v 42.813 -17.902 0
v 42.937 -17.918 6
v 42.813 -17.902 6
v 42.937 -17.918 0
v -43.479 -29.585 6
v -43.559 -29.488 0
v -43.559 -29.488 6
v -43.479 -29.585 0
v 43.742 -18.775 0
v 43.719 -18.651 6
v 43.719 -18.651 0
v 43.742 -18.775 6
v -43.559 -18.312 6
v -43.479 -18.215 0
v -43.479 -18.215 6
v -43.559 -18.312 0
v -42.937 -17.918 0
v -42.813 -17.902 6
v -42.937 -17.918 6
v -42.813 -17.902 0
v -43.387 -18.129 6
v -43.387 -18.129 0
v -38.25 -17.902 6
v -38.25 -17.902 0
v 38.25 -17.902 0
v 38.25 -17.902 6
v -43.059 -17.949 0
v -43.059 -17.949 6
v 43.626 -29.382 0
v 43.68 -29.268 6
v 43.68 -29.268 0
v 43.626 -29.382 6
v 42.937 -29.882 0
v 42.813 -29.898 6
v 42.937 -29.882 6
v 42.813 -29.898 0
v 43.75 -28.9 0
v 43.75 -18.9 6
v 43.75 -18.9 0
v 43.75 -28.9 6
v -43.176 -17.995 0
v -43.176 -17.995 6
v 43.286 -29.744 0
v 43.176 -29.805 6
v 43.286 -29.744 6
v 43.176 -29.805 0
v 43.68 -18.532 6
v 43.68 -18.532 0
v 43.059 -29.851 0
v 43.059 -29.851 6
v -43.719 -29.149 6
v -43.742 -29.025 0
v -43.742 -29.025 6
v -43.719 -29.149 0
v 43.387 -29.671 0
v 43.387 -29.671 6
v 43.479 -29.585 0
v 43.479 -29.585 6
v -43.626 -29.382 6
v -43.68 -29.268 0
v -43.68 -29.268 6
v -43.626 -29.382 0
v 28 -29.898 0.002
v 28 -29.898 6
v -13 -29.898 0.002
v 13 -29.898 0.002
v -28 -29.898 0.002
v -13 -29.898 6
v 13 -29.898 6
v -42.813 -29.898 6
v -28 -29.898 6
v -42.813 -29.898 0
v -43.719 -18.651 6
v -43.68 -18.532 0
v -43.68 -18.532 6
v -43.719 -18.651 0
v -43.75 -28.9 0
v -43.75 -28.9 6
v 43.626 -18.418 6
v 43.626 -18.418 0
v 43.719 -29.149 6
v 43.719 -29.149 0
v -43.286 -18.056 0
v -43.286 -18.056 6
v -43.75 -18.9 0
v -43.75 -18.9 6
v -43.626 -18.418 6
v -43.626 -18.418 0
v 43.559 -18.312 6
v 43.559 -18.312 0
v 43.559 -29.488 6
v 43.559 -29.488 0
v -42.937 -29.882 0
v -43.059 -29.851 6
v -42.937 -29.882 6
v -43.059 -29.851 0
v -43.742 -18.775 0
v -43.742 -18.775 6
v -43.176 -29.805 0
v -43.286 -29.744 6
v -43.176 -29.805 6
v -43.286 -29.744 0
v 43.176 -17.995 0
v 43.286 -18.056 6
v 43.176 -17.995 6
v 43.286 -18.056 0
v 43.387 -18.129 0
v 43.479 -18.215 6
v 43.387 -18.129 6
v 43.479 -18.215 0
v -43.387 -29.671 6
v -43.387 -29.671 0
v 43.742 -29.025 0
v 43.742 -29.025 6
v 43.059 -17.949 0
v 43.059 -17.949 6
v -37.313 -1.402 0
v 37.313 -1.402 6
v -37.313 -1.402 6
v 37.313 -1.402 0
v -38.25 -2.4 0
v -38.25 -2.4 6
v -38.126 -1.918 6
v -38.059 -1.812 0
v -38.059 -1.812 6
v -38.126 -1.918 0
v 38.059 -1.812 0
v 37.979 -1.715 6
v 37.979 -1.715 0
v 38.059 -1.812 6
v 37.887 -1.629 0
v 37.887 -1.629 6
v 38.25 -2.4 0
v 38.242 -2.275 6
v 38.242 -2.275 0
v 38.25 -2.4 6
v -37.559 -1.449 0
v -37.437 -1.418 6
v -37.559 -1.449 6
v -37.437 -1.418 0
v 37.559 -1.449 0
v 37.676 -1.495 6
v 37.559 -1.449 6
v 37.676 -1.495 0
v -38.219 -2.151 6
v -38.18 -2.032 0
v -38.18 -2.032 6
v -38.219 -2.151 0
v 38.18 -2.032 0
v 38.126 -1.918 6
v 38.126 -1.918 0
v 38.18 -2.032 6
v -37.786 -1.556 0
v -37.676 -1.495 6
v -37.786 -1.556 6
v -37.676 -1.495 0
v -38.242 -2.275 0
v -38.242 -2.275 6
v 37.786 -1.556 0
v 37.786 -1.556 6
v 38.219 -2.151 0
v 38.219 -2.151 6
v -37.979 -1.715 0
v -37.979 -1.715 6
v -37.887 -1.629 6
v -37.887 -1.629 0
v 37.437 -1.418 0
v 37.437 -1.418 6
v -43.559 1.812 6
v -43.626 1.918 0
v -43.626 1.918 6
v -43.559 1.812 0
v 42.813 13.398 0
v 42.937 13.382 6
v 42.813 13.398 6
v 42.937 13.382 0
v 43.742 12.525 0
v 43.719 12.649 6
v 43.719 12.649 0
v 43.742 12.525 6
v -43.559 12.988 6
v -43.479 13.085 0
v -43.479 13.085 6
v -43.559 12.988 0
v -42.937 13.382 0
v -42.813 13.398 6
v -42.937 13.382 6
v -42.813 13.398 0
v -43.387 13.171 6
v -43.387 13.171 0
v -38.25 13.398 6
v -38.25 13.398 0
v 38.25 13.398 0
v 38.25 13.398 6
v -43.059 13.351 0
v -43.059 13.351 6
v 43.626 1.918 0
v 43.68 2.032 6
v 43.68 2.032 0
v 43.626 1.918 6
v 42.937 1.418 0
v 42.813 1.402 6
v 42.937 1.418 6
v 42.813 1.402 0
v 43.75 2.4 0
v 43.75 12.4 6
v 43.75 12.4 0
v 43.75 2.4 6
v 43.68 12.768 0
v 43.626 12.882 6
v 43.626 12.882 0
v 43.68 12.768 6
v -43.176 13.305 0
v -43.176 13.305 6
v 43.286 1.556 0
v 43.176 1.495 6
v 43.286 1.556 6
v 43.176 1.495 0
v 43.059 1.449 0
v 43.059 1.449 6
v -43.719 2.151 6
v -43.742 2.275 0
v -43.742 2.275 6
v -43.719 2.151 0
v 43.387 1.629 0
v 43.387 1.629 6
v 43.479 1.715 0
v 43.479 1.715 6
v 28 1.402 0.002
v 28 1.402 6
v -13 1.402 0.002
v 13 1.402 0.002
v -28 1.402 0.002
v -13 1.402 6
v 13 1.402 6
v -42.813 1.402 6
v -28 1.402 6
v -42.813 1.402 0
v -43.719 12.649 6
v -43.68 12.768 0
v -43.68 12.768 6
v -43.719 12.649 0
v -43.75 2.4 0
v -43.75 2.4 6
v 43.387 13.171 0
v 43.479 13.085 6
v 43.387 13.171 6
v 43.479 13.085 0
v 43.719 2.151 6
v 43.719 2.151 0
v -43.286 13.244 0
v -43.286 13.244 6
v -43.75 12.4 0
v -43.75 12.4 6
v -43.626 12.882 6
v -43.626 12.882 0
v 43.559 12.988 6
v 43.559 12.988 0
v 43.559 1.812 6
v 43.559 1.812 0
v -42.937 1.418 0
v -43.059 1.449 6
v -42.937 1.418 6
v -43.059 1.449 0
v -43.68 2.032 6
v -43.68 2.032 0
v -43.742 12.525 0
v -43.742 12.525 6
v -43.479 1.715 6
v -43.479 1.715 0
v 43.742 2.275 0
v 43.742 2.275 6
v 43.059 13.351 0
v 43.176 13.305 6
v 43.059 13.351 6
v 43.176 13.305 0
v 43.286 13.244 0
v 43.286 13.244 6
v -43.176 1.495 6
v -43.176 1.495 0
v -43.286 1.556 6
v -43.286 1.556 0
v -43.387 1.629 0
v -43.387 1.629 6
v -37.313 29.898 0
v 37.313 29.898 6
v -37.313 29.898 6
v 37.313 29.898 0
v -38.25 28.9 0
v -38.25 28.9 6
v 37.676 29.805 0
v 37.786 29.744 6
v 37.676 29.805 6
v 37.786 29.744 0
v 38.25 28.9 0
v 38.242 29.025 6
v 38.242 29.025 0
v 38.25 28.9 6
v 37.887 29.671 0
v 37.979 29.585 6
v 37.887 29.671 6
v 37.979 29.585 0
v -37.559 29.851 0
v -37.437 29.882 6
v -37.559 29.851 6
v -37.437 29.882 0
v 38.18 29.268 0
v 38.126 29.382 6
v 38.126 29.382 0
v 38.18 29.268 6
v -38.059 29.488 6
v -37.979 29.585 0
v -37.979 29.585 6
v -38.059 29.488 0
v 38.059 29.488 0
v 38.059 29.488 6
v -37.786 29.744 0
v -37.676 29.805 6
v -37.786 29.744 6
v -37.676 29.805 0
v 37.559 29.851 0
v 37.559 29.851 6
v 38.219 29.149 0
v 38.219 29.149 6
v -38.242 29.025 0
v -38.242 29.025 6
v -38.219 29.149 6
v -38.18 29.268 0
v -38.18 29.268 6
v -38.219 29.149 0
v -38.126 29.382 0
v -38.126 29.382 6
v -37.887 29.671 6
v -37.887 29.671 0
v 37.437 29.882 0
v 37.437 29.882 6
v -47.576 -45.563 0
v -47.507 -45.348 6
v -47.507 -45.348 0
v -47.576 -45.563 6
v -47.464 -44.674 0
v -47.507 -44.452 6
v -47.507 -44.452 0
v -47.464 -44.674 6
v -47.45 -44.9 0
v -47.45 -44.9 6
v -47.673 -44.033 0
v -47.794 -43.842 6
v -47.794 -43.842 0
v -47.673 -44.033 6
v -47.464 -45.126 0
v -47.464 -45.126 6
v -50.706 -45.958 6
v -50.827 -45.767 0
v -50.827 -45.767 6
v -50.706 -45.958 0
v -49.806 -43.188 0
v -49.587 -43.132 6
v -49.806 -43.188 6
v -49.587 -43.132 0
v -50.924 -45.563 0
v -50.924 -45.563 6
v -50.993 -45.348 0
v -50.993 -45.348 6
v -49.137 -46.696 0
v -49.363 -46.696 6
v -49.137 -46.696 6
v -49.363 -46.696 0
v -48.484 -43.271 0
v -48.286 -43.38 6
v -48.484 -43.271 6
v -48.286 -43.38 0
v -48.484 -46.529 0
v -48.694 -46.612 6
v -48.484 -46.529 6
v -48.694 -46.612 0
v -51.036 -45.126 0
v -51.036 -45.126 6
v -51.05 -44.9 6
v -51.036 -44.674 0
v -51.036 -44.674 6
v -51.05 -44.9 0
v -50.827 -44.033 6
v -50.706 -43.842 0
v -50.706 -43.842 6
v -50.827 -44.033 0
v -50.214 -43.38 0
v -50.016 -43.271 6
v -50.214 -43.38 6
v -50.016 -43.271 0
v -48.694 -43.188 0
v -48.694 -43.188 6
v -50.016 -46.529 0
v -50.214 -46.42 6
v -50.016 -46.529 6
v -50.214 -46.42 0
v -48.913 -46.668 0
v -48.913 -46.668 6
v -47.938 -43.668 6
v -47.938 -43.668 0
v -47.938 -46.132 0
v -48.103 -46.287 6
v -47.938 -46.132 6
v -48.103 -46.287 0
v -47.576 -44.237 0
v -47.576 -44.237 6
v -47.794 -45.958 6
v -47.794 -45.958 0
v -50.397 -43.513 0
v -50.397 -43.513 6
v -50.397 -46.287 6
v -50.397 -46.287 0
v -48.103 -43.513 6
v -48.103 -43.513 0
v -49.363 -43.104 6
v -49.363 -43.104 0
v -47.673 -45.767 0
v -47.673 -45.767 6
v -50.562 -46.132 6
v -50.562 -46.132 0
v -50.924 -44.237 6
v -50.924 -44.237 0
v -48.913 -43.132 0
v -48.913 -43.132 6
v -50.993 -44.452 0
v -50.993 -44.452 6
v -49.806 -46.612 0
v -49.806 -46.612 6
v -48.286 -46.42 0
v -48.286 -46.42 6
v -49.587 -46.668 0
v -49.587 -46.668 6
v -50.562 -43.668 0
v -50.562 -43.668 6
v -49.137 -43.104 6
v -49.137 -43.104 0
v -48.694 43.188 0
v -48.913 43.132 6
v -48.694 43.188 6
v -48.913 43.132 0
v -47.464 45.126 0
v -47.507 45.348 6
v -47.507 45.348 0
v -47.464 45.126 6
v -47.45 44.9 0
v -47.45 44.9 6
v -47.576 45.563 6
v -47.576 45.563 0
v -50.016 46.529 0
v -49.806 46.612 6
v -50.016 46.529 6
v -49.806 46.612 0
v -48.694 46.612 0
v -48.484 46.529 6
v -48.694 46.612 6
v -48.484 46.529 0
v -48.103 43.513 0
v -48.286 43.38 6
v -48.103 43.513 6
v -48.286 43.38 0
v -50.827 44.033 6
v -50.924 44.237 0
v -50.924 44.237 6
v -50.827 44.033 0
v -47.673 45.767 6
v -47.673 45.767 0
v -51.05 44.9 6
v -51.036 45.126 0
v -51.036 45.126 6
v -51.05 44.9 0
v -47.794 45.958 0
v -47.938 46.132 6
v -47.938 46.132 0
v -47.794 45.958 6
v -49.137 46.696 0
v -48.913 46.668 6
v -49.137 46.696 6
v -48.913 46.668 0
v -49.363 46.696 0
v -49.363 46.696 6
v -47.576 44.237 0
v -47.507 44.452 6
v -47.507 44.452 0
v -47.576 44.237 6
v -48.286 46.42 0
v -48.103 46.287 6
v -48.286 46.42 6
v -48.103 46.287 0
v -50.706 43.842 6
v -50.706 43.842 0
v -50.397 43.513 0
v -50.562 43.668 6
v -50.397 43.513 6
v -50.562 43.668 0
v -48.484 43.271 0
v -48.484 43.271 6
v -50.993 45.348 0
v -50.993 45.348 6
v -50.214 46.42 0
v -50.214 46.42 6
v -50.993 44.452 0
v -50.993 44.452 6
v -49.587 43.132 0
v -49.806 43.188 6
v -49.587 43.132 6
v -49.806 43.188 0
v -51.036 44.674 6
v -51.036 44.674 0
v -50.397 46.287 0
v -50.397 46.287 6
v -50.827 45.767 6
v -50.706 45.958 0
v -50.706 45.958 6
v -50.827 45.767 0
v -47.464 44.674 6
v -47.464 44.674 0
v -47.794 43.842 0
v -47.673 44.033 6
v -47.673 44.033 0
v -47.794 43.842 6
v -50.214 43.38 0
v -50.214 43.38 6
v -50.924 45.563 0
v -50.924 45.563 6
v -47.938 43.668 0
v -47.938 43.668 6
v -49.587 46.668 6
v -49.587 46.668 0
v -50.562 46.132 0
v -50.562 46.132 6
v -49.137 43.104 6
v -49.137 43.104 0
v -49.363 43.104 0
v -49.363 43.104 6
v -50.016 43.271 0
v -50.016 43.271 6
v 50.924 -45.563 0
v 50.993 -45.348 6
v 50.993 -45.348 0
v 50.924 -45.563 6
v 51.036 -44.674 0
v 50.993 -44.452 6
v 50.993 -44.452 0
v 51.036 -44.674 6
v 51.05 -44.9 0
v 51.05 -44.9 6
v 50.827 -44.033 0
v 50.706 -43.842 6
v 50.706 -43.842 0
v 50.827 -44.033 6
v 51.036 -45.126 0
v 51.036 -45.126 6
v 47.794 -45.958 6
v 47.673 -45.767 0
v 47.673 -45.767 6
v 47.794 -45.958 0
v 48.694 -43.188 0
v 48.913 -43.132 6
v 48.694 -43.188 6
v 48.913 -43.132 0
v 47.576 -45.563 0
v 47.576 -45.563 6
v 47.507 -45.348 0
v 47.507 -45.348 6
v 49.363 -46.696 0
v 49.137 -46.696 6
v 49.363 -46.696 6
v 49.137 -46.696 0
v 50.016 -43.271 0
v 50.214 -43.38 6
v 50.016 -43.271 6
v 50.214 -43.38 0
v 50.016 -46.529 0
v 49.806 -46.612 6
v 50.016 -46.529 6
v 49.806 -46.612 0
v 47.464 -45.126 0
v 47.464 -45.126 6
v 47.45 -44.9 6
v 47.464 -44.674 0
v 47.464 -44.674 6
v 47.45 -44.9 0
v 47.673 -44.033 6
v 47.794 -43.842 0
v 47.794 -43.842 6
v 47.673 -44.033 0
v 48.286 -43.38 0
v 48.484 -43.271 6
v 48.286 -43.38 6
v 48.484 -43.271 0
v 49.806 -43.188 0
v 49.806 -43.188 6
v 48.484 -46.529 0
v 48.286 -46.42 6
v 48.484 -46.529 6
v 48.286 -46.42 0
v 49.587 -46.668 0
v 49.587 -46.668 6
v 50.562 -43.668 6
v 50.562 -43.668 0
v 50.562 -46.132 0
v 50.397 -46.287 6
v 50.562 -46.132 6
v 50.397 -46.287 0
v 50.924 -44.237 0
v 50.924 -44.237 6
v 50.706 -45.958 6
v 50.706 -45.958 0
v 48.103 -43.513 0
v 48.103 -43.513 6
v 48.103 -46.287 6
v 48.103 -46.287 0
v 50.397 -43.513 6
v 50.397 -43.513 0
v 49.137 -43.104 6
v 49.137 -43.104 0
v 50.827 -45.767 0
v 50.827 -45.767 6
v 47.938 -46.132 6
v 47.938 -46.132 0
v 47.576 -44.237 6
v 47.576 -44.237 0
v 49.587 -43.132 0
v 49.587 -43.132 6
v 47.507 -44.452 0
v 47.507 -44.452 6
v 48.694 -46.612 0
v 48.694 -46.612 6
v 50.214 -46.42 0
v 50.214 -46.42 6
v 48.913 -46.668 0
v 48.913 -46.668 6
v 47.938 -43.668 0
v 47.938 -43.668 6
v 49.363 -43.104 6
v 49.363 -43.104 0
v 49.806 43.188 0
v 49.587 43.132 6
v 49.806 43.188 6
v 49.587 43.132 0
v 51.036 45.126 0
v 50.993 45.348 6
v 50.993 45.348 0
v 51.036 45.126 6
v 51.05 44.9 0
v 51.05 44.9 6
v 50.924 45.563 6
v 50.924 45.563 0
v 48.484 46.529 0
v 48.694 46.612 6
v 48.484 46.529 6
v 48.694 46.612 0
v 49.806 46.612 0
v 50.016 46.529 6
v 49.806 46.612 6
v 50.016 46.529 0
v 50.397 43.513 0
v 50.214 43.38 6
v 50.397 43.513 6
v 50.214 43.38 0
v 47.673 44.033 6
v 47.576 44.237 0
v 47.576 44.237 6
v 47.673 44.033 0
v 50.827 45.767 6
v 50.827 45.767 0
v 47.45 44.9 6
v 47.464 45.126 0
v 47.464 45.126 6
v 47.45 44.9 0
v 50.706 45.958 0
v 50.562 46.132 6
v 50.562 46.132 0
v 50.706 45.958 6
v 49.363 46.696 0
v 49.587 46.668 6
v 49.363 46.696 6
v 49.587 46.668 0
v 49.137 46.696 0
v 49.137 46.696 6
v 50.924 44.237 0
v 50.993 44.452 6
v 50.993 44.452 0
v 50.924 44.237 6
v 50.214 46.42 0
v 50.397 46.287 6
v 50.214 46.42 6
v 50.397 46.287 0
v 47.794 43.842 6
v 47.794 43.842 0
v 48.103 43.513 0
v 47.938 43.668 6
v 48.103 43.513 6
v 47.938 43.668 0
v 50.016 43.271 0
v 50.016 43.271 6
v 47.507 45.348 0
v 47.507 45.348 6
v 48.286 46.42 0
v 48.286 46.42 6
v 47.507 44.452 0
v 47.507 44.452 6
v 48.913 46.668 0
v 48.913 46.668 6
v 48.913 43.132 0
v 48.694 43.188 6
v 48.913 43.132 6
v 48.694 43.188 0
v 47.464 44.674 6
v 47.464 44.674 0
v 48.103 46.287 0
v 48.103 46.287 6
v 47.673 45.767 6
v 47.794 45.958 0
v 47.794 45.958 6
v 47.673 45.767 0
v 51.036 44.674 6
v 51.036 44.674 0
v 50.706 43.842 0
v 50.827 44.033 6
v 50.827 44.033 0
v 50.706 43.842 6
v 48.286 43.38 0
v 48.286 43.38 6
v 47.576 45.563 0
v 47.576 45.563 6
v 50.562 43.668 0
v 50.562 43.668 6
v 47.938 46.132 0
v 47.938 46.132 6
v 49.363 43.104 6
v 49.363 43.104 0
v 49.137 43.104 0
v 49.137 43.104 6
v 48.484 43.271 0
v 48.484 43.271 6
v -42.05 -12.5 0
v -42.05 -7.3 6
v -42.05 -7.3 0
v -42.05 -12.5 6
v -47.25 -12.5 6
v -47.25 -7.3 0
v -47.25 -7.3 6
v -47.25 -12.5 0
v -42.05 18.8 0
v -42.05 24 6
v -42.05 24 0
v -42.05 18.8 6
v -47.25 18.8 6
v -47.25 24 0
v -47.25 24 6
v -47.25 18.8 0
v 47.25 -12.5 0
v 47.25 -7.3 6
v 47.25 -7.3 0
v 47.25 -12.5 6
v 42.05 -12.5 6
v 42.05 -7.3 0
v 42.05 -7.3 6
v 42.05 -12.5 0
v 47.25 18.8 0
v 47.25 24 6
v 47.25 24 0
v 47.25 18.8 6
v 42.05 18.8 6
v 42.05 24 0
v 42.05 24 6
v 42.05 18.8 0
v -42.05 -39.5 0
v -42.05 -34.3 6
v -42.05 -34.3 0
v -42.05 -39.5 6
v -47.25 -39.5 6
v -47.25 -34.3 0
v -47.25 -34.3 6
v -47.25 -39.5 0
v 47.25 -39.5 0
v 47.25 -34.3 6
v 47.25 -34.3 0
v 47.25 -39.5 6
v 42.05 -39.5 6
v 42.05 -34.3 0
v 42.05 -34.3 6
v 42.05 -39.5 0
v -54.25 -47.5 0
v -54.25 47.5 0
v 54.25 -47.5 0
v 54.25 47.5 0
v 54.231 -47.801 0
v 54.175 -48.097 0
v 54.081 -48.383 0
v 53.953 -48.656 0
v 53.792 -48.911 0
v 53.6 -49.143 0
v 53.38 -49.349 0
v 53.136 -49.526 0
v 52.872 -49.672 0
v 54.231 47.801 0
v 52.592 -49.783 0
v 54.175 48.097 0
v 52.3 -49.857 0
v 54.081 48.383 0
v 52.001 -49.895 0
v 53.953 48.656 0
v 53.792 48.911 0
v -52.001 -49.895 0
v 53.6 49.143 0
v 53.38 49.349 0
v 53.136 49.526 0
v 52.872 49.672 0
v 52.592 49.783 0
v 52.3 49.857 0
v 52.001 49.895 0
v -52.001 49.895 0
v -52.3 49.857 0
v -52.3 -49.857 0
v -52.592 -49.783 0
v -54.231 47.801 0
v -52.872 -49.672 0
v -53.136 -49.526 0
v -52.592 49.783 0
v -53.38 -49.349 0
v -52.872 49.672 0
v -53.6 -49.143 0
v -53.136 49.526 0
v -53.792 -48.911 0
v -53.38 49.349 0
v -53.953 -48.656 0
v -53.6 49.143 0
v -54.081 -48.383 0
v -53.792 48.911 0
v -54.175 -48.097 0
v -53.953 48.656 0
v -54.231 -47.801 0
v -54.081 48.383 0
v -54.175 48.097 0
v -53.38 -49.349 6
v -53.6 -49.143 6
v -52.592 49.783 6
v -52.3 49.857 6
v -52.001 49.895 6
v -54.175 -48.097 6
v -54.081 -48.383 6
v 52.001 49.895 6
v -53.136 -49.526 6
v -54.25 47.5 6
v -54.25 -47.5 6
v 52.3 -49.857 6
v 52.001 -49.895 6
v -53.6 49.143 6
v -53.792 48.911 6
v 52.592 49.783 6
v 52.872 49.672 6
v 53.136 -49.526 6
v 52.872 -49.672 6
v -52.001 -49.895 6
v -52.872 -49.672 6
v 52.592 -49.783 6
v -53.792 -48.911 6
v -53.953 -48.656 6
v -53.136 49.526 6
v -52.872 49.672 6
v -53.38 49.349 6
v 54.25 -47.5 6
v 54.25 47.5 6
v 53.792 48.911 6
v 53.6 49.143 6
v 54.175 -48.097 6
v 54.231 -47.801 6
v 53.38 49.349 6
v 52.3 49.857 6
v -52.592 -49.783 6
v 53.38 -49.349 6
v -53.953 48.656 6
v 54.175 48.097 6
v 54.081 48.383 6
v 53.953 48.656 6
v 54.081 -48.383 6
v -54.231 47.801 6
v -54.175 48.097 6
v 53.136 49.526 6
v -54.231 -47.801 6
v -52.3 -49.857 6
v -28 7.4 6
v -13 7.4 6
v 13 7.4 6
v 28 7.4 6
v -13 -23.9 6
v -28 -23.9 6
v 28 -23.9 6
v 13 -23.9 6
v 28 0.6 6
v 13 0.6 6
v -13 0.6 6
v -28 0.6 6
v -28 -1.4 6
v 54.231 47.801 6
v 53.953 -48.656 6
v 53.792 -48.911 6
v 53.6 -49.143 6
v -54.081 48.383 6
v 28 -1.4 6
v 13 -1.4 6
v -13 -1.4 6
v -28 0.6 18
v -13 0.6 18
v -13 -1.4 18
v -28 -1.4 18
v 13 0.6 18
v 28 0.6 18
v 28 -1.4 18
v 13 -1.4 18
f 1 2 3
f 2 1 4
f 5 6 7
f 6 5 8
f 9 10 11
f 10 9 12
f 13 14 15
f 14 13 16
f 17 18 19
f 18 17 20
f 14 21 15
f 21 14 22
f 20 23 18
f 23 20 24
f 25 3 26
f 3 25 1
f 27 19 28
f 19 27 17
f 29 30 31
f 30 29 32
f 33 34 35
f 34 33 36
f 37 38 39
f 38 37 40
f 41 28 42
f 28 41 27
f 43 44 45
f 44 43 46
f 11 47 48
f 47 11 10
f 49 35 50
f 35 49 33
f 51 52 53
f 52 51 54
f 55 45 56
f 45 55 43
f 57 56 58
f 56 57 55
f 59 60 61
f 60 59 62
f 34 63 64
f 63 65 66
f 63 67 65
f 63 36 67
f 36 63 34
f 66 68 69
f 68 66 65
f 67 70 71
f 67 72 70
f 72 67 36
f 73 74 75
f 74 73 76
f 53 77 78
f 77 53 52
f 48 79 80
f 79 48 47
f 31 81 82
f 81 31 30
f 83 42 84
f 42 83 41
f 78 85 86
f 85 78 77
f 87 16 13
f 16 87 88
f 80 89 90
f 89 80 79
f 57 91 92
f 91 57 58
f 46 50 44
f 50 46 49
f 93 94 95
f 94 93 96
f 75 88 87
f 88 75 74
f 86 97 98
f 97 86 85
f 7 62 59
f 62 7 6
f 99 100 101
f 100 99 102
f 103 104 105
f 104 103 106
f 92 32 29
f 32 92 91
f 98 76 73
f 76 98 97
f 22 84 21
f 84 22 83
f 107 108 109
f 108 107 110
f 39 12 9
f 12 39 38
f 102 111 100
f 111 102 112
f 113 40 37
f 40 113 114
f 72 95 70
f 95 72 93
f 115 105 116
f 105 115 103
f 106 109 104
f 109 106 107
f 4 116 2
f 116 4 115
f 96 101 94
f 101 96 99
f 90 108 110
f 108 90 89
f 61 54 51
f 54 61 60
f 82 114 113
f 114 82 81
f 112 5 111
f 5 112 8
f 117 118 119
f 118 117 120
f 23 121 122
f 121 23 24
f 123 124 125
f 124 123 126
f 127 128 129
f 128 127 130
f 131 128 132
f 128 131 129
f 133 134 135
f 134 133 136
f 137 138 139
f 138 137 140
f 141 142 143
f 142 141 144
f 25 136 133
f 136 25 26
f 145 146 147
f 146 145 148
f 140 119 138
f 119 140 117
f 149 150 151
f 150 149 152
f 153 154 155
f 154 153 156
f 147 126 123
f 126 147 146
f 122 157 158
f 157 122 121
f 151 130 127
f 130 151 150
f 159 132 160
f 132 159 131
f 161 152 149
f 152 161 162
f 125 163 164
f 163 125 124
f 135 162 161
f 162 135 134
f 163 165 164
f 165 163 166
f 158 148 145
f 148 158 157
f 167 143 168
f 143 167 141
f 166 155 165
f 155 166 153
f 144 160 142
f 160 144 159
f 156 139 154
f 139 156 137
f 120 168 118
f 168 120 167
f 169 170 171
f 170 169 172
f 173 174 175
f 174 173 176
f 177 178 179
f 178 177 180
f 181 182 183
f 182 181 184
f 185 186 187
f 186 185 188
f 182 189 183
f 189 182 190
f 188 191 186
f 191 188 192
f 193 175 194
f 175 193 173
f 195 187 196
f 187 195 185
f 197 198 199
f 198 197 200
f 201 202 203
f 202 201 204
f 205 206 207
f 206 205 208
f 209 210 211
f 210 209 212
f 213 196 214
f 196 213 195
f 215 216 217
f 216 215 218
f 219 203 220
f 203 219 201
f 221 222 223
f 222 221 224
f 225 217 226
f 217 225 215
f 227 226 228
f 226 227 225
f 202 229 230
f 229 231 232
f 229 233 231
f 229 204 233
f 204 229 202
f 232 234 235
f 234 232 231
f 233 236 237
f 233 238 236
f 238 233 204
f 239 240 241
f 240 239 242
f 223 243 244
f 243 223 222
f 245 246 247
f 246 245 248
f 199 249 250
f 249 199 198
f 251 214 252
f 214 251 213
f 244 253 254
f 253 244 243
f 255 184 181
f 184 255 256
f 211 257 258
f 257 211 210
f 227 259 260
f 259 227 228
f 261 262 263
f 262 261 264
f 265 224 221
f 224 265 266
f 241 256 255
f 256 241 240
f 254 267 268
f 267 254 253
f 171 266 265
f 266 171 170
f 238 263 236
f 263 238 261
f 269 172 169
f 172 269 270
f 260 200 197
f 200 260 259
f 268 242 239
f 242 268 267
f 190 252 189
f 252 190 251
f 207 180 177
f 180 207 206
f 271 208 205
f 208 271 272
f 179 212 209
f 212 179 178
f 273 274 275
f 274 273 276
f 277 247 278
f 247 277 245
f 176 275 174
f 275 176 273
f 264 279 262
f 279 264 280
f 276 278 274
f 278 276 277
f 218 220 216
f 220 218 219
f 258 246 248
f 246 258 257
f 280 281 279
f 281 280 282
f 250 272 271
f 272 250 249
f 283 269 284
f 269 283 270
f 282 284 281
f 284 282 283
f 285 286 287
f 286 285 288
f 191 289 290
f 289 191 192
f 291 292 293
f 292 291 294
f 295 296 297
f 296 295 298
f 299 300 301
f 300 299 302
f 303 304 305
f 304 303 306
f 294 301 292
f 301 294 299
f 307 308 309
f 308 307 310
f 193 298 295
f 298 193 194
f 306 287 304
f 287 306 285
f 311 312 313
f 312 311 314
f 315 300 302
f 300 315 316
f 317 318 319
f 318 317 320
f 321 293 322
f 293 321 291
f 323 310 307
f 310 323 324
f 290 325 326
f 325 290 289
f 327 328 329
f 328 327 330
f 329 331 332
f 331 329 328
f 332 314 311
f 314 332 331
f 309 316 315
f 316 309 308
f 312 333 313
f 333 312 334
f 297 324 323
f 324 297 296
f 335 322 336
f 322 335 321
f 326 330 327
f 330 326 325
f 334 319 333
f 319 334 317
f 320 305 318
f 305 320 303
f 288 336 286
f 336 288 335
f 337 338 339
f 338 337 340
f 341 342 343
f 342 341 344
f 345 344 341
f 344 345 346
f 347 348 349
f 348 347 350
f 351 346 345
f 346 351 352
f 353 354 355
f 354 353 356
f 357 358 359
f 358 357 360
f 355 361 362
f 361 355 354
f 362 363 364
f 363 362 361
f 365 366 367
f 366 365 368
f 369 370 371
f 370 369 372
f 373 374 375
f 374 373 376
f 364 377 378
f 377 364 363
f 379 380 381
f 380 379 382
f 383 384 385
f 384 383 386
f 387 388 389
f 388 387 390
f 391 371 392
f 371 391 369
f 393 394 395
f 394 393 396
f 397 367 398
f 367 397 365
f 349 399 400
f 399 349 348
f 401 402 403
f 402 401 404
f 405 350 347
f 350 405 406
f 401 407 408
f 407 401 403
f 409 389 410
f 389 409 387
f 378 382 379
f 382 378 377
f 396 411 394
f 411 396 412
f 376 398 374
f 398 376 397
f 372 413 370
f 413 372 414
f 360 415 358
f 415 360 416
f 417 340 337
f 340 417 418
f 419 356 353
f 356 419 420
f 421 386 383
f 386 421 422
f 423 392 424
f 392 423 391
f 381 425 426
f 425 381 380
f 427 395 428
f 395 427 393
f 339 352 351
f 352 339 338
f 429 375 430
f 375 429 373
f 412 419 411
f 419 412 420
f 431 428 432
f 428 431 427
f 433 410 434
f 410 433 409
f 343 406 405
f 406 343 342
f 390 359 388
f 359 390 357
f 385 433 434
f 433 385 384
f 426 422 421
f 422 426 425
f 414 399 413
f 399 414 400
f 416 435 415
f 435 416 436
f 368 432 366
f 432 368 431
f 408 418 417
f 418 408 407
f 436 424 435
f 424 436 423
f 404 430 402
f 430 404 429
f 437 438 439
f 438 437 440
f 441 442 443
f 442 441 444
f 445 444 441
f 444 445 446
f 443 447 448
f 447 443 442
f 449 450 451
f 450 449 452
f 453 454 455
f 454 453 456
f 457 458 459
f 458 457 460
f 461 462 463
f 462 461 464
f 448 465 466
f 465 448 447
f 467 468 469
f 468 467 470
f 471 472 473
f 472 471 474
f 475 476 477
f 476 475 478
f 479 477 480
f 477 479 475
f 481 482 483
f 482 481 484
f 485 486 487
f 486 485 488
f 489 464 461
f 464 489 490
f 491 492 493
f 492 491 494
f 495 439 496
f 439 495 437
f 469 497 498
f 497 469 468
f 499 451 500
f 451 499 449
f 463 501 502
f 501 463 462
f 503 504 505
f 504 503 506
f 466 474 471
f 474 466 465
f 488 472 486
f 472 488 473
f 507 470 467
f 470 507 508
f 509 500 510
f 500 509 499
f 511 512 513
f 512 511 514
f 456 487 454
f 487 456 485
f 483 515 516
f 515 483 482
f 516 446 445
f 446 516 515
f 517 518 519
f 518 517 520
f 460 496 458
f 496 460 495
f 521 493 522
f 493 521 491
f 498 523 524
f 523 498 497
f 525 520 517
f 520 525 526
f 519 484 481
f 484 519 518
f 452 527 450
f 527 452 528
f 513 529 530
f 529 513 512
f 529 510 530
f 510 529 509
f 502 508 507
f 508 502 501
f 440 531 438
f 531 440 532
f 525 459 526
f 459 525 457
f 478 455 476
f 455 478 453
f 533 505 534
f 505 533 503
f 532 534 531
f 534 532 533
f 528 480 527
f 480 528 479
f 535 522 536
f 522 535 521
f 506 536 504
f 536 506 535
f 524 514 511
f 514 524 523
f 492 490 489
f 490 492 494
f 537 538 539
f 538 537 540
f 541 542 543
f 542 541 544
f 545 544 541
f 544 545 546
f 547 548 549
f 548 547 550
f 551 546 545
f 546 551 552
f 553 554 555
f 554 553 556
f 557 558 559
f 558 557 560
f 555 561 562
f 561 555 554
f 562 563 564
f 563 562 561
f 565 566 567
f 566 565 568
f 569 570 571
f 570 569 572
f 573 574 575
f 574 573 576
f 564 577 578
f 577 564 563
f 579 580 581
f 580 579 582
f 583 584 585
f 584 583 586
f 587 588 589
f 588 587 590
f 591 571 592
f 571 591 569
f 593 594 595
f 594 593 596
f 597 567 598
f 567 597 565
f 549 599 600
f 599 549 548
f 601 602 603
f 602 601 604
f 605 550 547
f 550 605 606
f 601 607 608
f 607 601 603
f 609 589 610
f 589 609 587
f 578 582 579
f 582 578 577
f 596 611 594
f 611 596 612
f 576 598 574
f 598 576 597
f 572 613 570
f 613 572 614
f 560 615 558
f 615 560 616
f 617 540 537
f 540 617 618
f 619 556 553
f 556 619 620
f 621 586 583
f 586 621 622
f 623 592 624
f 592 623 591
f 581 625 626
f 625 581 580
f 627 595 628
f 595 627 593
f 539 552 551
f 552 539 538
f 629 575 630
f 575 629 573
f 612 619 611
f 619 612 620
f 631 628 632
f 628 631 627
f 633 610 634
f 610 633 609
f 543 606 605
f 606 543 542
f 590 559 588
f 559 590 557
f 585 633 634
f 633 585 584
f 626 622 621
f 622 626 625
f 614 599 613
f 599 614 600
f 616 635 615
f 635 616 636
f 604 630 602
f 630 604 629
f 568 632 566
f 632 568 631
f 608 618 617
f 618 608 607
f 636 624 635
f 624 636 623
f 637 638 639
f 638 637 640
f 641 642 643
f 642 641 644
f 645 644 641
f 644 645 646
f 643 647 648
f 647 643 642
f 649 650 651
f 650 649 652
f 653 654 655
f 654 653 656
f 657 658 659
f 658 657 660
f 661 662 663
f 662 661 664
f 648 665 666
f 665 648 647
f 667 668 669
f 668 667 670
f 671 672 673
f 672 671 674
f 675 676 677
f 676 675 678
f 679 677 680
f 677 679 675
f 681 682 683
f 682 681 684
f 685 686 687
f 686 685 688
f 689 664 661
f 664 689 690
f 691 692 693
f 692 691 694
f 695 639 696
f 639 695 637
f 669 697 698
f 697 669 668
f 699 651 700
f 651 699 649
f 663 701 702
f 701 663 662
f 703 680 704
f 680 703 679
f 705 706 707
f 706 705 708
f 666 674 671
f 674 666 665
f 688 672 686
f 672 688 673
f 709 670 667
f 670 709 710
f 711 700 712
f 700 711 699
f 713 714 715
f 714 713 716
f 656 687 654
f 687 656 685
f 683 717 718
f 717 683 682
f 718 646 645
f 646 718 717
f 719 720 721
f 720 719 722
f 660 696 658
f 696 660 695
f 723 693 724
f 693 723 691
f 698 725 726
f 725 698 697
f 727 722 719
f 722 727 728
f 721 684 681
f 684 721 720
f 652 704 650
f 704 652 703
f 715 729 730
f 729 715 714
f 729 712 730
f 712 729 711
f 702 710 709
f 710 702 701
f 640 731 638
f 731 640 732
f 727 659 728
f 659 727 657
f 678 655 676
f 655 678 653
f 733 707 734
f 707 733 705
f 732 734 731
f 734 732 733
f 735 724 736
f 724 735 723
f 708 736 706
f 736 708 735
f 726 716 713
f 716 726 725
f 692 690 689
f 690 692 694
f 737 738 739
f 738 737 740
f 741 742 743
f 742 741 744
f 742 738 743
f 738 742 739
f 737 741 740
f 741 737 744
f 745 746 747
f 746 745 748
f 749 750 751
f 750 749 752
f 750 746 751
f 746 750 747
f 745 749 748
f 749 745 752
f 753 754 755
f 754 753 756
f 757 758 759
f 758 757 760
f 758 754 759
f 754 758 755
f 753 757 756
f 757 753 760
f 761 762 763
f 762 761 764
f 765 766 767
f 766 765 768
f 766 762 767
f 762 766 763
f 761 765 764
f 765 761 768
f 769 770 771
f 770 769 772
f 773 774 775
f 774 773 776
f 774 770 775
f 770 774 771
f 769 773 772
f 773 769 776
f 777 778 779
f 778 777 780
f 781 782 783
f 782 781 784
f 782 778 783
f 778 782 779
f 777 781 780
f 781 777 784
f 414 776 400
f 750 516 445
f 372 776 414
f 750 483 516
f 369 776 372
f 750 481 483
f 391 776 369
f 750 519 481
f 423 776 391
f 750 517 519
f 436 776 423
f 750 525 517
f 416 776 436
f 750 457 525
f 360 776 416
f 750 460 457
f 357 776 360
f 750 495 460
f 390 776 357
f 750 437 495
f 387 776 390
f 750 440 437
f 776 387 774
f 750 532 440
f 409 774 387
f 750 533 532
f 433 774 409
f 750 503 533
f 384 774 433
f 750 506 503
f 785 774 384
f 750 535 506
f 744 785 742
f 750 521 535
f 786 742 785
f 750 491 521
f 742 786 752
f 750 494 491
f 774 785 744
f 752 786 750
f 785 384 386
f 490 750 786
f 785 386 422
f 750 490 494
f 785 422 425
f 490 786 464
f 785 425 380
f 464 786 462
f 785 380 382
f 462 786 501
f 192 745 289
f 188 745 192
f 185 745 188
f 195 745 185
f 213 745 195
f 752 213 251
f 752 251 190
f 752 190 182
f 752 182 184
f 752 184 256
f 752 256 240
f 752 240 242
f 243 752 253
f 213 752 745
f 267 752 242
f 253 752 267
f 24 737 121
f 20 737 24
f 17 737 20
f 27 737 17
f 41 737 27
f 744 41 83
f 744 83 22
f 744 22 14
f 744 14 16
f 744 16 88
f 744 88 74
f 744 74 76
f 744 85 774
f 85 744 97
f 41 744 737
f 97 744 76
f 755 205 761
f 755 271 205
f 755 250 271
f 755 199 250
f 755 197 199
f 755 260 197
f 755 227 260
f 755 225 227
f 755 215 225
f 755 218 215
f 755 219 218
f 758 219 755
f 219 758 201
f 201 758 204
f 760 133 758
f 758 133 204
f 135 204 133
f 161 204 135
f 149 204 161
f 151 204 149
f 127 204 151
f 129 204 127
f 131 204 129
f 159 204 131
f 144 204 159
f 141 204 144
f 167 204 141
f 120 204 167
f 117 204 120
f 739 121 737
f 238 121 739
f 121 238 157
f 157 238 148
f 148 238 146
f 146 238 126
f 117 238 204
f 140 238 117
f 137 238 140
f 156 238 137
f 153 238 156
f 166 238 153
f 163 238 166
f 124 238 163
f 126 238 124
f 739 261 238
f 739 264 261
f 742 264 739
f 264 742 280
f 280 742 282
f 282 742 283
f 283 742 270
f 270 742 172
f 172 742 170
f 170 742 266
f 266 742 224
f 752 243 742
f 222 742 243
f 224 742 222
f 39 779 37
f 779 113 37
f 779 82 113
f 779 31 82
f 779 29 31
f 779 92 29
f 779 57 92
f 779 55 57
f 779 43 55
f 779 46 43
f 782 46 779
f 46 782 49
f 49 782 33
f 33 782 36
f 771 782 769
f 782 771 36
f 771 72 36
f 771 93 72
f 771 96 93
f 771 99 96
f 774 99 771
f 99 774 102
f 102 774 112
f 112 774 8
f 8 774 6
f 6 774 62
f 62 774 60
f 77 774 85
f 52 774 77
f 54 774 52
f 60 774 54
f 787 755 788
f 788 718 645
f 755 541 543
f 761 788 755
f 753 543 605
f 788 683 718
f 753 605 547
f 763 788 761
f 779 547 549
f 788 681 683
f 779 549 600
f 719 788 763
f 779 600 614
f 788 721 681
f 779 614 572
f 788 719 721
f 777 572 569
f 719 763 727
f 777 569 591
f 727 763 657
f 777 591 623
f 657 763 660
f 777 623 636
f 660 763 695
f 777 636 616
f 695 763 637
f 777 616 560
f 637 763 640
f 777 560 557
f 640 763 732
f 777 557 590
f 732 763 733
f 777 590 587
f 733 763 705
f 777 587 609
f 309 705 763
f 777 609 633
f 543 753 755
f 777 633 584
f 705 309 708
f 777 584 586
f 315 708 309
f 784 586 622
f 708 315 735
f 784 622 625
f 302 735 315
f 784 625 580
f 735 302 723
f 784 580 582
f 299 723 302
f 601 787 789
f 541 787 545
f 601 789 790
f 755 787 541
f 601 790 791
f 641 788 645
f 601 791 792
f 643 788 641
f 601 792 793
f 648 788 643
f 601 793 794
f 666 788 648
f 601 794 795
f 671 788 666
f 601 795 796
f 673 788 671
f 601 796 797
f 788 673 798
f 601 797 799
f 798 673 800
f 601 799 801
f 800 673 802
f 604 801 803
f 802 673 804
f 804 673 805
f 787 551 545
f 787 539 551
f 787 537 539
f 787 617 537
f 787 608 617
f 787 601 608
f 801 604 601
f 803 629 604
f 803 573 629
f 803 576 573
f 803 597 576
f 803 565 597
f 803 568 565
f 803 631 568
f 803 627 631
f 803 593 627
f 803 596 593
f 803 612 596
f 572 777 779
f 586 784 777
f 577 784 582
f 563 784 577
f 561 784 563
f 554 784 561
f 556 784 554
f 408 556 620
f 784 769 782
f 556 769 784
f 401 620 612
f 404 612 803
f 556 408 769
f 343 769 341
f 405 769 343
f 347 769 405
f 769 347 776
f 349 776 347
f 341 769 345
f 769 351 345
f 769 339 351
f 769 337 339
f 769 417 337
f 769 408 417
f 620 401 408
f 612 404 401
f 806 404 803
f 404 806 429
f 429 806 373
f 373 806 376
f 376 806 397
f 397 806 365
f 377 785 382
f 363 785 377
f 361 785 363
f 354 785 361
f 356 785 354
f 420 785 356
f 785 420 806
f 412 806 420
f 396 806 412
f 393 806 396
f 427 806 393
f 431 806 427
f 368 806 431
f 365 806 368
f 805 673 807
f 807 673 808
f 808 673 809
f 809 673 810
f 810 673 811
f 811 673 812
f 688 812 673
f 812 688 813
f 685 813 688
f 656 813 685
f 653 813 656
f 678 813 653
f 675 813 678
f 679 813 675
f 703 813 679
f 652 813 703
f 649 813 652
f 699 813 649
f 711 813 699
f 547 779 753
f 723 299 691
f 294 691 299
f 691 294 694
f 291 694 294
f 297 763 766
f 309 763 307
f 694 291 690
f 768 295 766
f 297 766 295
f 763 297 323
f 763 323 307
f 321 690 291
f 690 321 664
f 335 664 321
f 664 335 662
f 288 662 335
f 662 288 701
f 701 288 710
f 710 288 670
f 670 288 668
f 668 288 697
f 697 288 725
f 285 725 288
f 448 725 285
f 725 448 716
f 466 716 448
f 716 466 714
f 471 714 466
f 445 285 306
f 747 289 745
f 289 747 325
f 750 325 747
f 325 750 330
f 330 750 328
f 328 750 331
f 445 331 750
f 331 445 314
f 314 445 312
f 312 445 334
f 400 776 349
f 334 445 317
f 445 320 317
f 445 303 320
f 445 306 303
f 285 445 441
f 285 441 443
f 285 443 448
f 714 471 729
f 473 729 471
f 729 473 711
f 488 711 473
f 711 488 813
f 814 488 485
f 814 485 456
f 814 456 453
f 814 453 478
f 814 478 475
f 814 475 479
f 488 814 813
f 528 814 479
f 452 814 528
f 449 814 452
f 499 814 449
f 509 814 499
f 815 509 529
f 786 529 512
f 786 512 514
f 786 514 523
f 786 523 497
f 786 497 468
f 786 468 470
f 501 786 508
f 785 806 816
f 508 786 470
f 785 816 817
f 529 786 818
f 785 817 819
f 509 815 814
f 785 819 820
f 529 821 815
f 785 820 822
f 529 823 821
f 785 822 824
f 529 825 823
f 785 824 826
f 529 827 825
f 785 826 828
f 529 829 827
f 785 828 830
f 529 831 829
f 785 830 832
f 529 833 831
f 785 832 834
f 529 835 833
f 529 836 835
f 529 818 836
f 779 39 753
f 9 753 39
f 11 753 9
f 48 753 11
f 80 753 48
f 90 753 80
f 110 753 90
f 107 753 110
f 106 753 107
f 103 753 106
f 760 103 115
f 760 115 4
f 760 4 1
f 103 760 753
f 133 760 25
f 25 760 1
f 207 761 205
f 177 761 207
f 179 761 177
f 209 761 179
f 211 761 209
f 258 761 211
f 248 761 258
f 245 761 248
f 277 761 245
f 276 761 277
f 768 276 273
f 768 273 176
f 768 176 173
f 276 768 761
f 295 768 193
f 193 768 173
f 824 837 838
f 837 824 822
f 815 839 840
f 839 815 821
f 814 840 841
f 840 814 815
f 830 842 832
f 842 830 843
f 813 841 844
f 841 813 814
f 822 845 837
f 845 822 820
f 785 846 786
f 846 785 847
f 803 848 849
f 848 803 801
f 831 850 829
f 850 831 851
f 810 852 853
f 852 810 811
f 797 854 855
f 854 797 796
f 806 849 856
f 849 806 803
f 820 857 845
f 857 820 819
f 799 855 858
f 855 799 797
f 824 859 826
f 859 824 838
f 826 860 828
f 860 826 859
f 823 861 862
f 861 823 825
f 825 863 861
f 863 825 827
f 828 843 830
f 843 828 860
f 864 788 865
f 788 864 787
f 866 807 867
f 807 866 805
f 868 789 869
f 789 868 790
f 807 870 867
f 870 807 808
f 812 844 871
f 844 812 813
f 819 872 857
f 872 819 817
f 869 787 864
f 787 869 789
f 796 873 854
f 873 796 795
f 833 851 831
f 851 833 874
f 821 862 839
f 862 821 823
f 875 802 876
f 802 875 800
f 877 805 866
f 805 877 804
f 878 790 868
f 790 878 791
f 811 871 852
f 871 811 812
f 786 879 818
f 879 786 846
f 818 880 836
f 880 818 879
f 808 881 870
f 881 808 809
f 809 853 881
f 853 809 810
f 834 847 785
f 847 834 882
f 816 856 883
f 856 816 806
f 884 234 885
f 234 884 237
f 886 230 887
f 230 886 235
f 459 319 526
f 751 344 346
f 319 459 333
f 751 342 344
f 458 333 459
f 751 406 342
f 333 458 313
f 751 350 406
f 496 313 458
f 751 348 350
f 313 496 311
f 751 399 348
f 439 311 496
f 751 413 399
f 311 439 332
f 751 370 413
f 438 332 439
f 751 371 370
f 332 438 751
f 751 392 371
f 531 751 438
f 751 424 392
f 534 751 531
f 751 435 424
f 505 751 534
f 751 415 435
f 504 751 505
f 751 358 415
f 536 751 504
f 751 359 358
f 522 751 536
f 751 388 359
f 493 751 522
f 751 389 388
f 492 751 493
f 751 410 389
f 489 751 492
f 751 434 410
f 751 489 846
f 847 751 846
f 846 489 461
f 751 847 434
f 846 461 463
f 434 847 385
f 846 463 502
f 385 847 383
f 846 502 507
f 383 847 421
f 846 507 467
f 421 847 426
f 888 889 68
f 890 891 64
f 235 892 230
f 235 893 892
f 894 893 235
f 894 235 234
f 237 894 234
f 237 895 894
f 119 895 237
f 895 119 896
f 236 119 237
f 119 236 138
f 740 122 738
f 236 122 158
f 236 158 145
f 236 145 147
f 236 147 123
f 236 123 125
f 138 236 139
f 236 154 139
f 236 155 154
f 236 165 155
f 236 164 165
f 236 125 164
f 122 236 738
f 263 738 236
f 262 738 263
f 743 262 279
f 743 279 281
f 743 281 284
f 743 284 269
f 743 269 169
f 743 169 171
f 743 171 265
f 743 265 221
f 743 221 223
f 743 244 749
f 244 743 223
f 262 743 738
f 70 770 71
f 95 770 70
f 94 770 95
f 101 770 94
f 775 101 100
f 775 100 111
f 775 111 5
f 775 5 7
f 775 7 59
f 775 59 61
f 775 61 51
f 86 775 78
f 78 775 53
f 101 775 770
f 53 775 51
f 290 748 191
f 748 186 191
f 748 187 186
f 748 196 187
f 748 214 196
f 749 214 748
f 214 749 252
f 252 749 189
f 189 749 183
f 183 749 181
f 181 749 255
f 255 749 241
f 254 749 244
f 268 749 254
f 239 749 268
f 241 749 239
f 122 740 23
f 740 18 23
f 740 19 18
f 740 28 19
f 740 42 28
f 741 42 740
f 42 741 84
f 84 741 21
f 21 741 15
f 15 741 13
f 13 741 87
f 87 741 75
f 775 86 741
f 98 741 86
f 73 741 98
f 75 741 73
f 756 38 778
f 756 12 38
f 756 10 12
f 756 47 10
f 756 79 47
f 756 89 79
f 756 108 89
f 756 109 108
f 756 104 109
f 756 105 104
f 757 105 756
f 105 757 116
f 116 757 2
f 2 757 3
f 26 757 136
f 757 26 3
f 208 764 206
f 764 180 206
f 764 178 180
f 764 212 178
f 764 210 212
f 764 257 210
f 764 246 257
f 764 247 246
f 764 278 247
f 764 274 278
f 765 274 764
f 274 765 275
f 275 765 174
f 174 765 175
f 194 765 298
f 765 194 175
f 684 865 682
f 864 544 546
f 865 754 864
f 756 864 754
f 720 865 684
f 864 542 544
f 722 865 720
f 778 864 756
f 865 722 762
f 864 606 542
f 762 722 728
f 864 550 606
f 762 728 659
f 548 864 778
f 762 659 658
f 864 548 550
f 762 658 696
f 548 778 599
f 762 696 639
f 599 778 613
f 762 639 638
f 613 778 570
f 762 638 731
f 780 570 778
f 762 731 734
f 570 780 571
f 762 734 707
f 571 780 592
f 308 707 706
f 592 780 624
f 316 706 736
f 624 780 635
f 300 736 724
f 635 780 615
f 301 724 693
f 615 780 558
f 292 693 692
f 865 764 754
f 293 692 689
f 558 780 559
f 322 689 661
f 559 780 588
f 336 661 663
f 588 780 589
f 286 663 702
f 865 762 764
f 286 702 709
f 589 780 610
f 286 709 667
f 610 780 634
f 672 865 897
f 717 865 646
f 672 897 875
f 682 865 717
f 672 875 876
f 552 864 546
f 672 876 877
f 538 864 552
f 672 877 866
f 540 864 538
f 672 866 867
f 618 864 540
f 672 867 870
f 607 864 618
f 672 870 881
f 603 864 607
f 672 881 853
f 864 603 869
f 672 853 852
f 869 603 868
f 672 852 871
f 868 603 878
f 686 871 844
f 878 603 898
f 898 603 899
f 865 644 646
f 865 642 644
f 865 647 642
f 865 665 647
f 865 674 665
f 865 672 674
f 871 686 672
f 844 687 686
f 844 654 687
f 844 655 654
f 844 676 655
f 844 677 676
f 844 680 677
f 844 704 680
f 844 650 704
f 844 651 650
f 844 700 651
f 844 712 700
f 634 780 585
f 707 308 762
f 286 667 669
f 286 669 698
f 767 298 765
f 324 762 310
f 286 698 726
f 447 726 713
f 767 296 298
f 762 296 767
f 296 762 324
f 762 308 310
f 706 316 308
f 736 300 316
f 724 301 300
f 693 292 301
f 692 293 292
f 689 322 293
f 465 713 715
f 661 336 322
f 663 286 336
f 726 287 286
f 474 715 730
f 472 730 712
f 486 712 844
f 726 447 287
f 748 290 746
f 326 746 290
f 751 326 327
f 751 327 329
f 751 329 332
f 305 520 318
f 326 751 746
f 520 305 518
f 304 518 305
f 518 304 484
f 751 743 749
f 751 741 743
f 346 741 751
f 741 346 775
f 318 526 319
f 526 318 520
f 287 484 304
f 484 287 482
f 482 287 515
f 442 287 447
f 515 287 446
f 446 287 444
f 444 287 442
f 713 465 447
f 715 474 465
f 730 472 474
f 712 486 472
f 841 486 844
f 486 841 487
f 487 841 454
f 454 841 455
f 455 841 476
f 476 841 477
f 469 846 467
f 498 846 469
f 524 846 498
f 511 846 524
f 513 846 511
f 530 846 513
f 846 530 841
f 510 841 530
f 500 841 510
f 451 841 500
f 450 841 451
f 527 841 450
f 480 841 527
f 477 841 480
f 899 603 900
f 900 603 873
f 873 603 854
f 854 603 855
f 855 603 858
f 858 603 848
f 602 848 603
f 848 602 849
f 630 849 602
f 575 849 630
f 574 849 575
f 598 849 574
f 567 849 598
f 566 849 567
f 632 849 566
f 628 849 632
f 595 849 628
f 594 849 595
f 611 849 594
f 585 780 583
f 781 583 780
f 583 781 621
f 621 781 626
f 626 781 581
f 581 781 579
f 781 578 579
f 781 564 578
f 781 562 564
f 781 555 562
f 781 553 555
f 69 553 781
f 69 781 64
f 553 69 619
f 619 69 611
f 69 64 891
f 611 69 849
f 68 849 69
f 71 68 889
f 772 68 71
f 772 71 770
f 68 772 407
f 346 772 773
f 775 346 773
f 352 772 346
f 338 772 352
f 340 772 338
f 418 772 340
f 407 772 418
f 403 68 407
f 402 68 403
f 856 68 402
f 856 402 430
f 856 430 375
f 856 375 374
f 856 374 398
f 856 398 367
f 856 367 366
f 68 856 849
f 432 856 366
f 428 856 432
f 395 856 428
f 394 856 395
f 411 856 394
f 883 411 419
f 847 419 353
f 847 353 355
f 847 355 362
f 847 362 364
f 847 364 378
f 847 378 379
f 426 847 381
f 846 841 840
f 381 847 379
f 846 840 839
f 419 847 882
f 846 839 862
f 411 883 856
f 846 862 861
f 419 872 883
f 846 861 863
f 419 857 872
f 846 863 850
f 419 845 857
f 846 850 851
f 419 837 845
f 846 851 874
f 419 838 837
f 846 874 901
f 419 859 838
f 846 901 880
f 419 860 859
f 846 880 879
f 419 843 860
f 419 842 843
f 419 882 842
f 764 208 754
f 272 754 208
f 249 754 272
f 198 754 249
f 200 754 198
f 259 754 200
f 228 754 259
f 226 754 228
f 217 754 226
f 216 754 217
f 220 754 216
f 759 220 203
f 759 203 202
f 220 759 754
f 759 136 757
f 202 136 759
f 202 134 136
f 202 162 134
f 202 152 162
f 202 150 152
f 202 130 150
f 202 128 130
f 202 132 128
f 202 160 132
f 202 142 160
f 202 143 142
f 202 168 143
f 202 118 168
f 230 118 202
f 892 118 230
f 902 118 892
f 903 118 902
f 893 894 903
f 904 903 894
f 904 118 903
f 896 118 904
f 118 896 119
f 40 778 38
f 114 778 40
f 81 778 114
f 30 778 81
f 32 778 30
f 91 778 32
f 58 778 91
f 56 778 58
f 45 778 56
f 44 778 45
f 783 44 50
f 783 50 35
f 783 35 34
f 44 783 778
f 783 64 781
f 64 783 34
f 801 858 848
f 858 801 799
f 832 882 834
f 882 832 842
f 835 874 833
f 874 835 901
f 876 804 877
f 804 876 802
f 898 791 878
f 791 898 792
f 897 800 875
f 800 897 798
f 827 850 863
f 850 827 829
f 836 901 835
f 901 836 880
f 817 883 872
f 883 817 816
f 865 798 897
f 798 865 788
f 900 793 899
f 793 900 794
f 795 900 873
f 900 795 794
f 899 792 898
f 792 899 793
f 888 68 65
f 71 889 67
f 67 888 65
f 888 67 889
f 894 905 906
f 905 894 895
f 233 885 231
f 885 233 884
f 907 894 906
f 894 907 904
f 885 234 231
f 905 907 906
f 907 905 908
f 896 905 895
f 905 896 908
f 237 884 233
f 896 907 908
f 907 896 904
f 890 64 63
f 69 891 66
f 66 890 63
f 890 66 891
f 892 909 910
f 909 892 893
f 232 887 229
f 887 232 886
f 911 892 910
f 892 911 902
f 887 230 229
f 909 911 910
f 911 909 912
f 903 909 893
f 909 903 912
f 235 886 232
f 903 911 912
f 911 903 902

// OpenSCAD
$fn = 50;

difference() {
	union() {
		translate(v = [0, 0, 0]) {
			rotate(a = [0, 0, 0]) {
				difference() {
					union() {
						translate(v = [0, 0, 0]) {
							rotate(a = [0, 0, 0]) {
								difference() {
									union() {
										hull() {
											translate(v = [-51.8500000005, 47.5000000005, 0]) {
												cylinder(h = 6.0, r = 2.4);
											}
											translate(v = [51.8500000005, 47.5000000005, 0]) {
												cylinder(h = 6.0, r = 2.4);
											}
											translate(v = [-51.8500000005, -47.5000000005, 0]) {
												cylinder(h = 6.0, r = 2.4);
											}
											translate(v = [51.8500000005, -47.5000000005, 0]) {
												cylinder(h = 6.0, r = 2.4);
											}
										}
									}
									union() {
										translate(v = [0.0, -23.900000000000006, -0.1]) {
											hull() {
												translate(v = [-42.75, 5.0, 0]) {
													cylinder(h = 18.2, r = 1.0);
												}
												translate(v = [42.75, 5.0, 0]) {
													cylinder(h = 18.2, r = 1.0);
												}
												translate(v = [-42.75, -5.0, 0]) {
													cylinder(h = 18.2, r = 1.0);
												}
												translate(v = [42.75, -5.0, 0]) {
													cylinder(h = 18.2, r = 1.0);
												}
											}
										}
										translate(v = [0.0, -15.650000000000006, -0.1]) {
											hull() {
												translate(v = [-37.25, 13.25, 0]) {
													cylinder(h = 18.2, r = 1.0);
												}
												translate(v = [37.25, 13.25, 0]) {
													cylinder(h = 18.2, r = 1.0);
												}
												translate(v = [-37.25, -13.25, 0]) {
													cylinder(h = 18.2, r = 1.0);
												}
												translate(v = [37.25, -13.25, 0]) {
													cylinder(h = 18.2, r = 1.0);
												}
											}
										}
										translate(v = [0.0, 7.399999999999995, -0.1]) {
											hull() {
												translate(v = [-42.75, 5.0, 0]) {
													cylinder(h = 18.2, r = 1.0);
												}
												translate(v = [42.75, 5.0, 0]) {
													cylinder(h = 18.2, r = 1.0);
												}
												translate(v = [-42.75, -5.0, 0]) {
													cylinder(h = 18.2, r = 1.0);
												}
												translate(v = [42.75, -5.0, 0]) {
													cylinder(h = 18.2, r = 1.0);
												}
											}
										}
										translate(v = [0.0, 15.649999999999995, -0.1]) {
											hull() {
												translate(v = [-37.25, 13.25, 0]) {
													cylinder(h = 18.2, r = 1.0);
												}
												translate(v = [37.25, 13.25, 0]) {
													cylinder(h = 18.2, r = 1.0);
												}
												translate(v = [-37.25, -13.25, 0]) {
													cylinder(h = 18.2, r = 1.0);
												}
												translate(v = [37.25, -13.25, 0]) {
													cylinder(h = 18.2, r = 1.0);
												}
											}
										}
										translate(v = [-49.2500000005, -44.9000000005, -0.1]) {
											cylinder(h = 6.2, r = 1.8);
										}
										translate(v = [-49.2500000005, 44.9000000005, -0.1]) {
											cylinder(h = 6.2, r = 1.8);
										}
										translate(v = [49.2500000005, -44.9000000005, -0.1]) {
											cylinder(h = 6.2, r = 1.8);
										}
										translate(v = [49.2500000005, 44.9000000005, -0.1]) {
											cylinder(h = 6.2, r = 1.8);
										}
										translate(v = [-47.25, -12.500000000000005, -0.1]) {
											cube(size = [5.2, 5.2, 6.2]);
										}
										translate(v = [-47.25, 18.799999999999994, -0.1]) {
											cube(size = [5.2, 5.2, 6.2]);
										}
										translate(v = [42.05, -12.500000000000005, -0.1]) {
											cube(size = [5.2, 5.2, 6.2]);
										}
										translate(v = [42.05, 18.799999999999994, -0.1]) {
											cube(size = [5.2, 5.2, 6.2]);
										}
										translate(v = [-47.25, -39.5, -0.1]) {
											cube(size = [5.2, 5.2, 6.2]);
										}
										translate(v = [42.05, -39.5, -0.1]) {
											cube(size = [5.2, 5.2, 6.2]);
										}
									}
								}
							}
						}
						translate(v = [0, 0, 0]) {
							rotate(a = [0, 0, 0]) {
								difference() {
									union() {
										translate(v = [-28.0, -31.7, 0]) {
											cube(size = [15.0, 7.8, 6.0]);
										}
									}
									union() {
										translate(v = [-28.1, -31.7, 0]) {
											rotate(a = [90, 0, 90]) {
												linear_extrude(height = 15.2) {
													polygon(points = [[1.6999999999999997, -0.1], [7.8999999999999995, -0.1], [7.8999999999999995, 6.1]]);
												}
											}
										}
									}
								}
							}
						}
						translate(v = [0, 0, 0]) {
							rotate(a = [0, 0, 0]) {
								difference() {
									union() {
										translate(v = [-28.0, -1.3999999999999986, 0]) {
											cube(size = [15.0, 8.8, 18.0]);
										}
									}
									union() {
										translate(v = [-28.1, 0.6000000000000014, 6.0]) {
											cube(size = [15.2, 8.8, 12.1]);
										}
										translate(v = [-28.1, -1.3999999999999986, 0]) {
											rotate(a = [90, 0, 90]) {
												linear_extrude(height = 15.2) {
													polygon(points = [[2.7000000000000006, -0.1], [8.9, -0.1], [8.9, 6.1]]);
												}
											}
										}
									}
								}
							}
						}
						translate(v = [0, 0, 0]) {
							rotate(a = [0, 0, 0]) {
								difference() {
									union() {
										translate(v = [13.0, -31.7, 0]) {
											cube(size = [15.0, 7.8, 6.0]);
										}
									}
									union() {
										translate(v = [12.9, -31.7, 0]) {
											rotate(a = [90, 0, 90]) {
												linear_extrude(height = 15.2) {
													polygon(points = [[1.6999999999999997, -0.1], [7.8999999999999995, -0.1], [7.8999999999999995, 6.1]]);
												}
											}
										}
									}
								}
							}
						}
						translate(v = [0, 0, 0]) {
							rotate(a = [0, 0, 0]) {
								difference() {
									union() {
										translate(v = [13.0, -1.3999999999999986, 0]) {
											cube(size = [15.0, 8.8, 18.0]);
										}
									}
									union() {
										translate(v = [12.9, 0.6000000000000014, 6.0]) {
											cube(size = [15.2, 8.8, 12.1]);
										}
										translate(v = [12.9, -1.3999999999999986, 0]) {
											rotate(a = [90, 0, 90]) {
												linear_extrude(height = 15.2) {
													polygon(points = [[2.7000000000000006, -0.1], [8.9, -0.1], [8.9, 6.1]]);
												}
											}
										}
									}
								}
							}
						}
					}
					union();
				}
			}
		}
	}
	union();
}
